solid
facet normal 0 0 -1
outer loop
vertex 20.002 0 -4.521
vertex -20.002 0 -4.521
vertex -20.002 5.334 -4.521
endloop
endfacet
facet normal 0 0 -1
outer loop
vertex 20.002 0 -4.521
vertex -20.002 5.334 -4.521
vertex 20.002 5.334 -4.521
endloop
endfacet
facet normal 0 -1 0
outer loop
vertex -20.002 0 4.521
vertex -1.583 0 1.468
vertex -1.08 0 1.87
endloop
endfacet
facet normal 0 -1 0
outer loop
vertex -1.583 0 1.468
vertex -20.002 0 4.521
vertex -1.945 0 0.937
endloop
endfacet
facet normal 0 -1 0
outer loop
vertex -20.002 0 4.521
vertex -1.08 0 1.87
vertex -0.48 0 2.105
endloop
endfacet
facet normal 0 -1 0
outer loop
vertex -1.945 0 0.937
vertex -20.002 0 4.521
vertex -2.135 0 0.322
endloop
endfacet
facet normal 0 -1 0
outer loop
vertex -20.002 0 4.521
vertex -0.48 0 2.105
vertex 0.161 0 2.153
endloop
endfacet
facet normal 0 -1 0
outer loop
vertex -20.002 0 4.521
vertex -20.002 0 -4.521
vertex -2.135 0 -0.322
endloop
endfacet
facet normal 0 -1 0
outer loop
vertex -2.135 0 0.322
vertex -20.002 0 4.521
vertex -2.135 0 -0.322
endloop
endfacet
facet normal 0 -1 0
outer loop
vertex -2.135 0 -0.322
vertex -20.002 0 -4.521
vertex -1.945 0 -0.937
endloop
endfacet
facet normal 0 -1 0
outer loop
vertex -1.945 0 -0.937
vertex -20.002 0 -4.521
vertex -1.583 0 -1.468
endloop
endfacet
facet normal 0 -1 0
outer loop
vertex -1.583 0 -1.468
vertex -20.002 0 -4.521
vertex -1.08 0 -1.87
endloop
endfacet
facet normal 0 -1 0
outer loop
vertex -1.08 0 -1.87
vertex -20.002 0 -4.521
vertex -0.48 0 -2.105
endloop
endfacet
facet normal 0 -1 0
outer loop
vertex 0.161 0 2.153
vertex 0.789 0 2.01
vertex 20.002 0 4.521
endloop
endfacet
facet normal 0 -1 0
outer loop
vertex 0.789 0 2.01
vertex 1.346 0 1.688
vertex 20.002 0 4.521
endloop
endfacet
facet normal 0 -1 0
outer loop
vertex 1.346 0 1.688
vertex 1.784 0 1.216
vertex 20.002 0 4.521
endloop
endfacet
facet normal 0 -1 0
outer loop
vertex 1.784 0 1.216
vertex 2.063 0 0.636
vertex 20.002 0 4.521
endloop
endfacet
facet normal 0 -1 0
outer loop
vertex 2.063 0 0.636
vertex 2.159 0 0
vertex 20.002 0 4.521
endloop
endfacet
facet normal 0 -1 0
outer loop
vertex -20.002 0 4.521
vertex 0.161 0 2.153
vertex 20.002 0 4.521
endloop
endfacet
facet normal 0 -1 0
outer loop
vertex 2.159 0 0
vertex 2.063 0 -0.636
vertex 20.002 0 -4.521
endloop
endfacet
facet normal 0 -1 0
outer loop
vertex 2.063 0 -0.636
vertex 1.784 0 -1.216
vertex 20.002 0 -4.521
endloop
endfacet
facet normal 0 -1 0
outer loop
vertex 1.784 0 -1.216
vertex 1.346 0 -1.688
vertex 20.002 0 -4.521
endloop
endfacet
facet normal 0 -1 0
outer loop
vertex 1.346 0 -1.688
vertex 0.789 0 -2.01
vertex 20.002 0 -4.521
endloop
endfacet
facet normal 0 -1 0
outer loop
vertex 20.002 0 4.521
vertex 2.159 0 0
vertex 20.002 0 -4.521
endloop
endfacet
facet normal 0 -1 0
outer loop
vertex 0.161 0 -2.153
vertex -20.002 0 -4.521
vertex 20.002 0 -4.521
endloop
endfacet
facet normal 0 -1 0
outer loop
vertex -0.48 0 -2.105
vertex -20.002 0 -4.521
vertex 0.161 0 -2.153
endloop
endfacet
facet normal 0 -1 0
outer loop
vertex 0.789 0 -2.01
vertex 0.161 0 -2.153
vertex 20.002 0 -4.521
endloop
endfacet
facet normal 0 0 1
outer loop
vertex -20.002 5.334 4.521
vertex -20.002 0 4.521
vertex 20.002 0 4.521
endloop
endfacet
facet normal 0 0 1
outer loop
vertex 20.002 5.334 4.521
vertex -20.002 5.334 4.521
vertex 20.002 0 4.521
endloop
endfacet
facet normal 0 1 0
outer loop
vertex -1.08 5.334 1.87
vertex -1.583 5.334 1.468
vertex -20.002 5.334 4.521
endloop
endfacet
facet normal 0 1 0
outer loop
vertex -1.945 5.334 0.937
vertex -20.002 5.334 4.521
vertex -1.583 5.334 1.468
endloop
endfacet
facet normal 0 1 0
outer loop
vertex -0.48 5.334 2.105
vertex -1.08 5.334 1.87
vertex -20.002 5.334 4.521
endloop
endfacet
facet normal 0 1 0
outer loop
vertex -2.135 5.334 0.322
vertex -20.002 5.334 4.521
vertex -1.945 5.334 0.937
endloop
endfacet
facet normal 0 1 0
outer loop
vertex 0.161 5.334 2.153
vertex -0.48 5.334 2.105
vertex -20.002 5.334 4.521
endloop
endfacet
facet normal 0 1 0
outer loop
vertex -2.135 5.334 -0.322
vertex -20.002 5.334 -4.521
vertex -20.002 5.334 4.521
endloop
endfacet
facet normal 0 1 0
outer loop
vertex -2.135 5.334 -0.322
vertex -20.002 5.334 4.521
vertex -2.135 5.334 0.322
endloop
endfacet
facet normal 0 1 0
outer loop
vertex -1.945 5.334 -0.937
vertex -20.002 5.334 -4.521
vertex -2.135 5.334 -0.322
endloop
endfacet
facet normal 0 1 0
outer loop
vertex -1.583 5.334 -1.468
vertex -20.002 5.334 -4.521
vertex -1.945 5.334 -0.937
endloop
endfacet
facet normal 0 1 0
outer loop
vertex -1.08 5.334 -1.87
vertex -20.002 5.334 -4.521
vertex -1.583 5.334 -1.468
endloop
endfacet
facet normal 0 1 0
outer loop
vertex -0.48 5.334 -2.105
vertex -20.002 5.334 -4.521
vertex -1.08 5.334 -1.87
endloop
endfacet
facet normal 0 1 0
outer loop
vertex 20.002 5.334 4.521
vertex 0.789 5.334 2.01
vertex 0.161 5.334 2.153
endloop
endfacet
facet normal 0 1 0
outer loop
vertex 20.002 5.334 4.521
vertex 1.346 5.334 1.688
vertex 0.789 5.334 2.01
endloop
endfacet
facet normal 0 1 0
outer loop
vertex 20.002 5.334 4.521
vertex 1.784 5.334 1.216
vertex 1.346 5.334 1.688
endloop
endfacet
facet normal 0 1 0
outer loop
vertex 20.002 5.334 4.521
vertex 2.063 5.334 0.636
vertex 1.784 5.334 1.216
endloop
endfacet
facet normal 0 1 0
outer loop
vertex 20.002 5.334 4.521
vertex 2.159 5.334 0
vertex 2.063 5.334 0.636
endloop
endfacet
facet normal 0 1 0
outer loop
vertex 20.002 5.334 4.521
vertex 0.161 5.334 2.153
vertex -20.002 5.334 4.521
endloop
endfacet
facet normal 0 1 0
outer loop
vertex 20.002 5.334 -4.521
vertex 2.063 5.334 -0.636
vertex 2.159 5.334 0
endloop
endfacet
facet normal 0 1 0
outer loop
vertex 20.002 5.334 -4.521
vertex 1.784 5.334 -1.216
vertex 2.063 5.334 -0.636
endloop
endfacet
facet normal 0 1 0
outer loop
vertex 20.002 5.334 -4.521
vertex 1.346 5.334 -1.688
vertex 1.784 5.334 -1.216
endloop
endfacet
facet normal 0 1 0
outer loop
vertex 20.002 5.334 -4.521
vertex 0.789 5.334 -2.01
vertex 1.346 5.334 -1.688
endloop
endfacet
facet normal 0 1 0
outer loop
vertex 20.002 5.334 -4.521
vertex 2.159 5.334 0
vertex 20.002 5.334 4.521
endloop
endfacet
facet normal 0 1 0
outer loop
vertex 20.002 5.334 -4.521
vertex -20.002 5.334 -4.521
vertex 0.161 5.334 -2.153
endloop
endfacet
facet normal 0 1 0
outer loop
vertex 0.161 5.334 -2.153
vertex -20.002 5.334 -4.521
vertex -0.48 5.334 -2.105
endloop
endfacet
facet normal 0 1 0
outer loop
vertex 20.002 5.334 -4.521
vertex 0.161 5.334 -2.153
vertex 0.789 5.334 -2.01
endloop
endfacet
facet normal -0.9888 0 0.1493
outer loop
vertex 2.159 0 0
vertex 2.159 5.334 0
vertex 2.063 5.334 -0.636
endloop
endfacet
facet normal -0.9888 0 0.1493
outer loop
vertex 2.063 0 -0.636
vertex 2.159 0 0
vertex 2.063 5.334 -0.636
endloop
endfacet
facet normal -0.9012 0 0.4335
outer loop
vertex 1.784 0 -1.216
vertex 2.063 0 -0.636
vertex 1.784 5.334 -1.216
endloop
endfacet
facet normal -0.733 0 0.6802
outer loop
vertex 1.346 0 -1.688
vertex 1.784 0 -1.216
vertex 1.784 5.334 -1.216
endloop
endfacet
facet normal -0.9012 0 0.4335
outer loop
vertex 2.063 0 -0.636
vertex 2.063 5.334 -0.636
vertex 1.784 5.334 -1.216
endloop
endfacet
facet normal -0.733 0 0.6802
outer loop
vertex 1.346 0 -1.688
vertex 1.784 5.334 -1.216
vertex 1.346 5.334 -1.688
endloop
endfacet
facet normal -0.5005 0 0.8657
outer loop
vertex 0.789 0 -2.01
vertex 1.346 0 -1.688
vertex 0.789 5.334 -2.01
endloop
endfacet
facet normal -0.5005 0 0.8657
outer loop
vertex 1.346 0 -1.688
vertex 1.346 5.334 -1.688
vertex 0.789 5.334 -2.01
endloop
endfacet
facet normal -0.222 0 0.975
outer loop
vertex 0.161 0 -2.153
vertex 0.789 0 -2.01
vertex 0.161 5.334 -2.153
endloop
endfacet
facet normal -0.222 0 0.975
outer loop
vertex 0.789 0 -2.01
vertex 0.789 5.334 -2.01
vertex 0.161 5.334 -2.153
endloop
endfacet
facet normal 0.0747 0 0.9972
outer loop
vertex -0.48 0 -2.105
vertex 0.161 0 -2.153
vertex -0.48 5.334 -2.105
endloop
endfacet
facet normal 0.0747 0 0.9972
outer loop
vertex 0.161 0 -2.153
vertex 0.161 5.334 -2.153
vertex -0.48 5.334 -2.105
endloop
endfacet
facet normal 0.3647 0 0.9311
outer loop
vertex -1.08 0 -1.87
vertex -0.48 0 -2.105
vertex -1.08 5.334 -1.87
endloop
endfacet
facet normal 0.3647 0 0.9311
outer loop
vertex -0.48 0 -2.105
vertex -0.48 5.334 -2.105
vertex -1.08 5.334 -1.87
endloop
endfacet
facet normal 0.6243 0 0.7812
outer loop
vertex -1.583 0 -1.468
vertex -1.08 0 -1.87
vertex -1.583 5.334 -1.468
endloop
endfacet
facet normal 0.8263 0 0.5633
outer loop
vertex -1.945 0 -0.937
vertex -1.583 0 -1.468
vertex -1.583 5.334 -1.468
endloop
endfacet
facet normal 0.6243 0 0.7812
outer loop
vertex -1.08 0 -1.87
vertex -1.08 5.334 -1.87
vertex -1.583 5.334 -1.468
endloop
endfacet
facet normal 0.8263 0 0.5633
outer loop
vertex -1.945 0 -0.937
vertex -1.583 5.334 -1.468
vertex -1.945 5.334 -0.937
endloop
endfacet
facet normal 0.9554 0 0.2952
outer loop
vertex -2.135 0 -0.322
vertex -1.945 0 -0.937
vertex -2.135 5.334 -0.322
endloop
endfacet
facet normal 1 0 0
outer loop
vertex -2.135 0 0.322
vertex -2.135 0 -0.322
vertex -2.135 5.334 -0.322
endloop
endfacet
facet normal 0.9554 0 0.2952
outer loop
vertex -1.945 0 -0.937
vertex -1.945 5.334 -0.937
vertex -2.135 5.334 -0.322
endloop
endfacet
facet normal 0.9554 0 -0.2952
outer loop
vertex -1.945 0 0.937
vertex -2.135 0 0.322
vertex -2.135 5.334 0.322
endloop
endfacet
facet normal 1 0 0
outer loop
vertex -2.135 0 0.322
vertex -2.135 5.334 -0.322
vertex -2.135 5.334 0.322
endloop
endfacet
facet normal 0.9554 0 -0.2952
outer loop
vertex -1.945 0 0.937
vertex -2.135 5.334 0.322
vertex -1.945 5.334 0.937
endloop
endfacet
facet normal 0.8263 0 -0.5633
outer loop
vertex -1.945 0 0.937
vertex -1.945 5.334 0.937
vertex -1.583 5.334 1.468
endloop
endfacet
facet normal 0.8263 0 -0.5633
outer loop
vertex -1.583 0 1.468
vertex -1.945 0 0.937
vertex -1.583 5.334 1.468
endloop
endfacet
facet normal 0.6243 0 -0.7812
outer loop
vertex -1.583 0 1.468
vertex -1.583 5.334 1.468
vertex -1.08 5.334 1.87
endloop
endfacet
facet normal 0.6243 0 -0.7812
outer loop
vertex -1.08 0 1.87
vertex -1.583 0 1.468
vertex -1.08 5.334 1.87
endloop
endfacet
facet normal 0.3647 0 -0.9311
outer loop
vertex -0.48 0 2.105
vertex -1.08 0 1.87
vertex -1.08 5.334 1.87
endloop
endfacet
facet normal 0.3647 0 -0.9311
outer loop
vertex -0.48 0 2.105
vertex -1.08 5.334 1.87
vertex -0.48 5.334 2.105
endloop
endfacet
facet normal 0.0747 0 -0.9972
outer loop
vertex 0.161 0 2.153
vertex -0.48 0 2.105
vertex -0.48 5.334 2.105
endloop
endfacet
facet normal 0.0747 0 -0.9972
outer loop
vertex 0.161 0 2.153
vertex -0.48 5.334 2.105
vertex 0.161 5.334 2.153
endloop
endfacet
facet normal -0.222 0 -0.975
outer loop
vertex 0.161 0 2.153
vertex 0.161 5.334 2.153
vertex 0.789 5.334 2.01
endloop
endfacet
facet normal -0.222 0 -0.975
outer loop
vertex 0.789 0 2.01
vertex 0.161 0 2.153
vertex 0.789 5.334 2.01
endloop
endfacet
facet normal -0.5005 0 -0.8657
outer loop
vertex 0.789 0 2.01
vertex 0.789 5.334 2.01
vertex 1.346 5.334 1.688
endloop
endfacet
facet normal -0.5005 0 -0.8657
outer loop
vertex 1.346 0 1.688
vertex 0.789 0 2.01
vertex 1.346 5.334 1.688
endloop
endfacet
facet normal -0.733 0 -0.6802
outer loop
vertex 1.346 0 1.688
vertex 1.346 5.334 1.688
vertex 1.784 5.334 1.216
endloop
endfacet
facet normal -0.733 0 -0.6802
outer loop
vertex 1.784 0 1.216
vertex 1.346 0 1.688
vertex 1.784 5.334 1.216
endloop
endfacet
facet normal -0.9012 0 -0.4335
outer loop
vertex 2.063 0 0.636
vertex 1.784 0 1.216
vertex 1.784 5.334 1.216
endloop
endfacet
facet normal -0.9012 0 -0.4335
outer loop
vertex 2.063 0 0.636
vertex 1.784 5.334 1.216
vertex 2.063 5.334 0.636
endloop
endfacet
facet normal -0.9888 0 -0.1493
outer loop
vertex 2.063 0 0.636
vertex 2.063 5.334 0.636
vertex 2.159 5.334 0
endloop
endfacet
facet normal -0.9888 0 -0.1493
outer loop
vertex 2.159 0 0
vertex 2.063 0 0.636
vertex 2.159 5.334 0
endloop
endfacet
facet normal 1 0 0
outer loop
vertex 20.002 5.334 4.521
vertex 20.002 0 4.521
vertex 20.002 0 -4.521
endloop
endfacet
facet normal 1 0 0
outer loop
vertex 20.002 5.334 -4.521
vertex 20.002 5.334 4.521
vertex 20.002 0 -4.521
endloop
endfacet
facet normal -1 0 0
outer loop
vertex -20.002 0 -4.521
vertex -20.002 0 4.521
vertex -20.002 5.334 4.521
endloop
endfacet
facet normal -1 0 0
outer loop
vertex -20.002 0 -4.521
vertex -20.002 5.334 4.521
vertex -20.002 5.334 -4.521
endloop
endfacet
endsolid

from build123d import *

# Parameters (mm, degrees)
SKETCH1_W           = 40.005
SKETCH1_H           = 9.0424
BOSS_EXTRUDE1_DEPTH = 5.334
SKETCH2_R           = 2.159
CUT_EXTRUDE1_DEPTH  = 6.334


with BuildPart() as part:
    # Sketch1 → Boss-Extrude1 (new body)
    with BuildSketch(Plane(origin=(0, 0, 0), x_dir=(1, 0, 0), z_dir=(0, 1, 0))):
        Rectangle(SKETCH1_W, SKETCH1_H)
    extrude(amount=BOSS_EXTRUDE1_DEPTH)

    # Sketch2 → Cut-Extrude1 (cut, through all)
    with BuildSketch(Plane(origin=(0, 5.334, 0), x_dir=(1, 0, 0), z_dir=(0, 1, 0))):
        Circle(SKETCH2_R)
    extrude(amount=-CUT_EXTRUDE1_DEPTH, mode=Mode.SUBTRACT)


solid = part.part
